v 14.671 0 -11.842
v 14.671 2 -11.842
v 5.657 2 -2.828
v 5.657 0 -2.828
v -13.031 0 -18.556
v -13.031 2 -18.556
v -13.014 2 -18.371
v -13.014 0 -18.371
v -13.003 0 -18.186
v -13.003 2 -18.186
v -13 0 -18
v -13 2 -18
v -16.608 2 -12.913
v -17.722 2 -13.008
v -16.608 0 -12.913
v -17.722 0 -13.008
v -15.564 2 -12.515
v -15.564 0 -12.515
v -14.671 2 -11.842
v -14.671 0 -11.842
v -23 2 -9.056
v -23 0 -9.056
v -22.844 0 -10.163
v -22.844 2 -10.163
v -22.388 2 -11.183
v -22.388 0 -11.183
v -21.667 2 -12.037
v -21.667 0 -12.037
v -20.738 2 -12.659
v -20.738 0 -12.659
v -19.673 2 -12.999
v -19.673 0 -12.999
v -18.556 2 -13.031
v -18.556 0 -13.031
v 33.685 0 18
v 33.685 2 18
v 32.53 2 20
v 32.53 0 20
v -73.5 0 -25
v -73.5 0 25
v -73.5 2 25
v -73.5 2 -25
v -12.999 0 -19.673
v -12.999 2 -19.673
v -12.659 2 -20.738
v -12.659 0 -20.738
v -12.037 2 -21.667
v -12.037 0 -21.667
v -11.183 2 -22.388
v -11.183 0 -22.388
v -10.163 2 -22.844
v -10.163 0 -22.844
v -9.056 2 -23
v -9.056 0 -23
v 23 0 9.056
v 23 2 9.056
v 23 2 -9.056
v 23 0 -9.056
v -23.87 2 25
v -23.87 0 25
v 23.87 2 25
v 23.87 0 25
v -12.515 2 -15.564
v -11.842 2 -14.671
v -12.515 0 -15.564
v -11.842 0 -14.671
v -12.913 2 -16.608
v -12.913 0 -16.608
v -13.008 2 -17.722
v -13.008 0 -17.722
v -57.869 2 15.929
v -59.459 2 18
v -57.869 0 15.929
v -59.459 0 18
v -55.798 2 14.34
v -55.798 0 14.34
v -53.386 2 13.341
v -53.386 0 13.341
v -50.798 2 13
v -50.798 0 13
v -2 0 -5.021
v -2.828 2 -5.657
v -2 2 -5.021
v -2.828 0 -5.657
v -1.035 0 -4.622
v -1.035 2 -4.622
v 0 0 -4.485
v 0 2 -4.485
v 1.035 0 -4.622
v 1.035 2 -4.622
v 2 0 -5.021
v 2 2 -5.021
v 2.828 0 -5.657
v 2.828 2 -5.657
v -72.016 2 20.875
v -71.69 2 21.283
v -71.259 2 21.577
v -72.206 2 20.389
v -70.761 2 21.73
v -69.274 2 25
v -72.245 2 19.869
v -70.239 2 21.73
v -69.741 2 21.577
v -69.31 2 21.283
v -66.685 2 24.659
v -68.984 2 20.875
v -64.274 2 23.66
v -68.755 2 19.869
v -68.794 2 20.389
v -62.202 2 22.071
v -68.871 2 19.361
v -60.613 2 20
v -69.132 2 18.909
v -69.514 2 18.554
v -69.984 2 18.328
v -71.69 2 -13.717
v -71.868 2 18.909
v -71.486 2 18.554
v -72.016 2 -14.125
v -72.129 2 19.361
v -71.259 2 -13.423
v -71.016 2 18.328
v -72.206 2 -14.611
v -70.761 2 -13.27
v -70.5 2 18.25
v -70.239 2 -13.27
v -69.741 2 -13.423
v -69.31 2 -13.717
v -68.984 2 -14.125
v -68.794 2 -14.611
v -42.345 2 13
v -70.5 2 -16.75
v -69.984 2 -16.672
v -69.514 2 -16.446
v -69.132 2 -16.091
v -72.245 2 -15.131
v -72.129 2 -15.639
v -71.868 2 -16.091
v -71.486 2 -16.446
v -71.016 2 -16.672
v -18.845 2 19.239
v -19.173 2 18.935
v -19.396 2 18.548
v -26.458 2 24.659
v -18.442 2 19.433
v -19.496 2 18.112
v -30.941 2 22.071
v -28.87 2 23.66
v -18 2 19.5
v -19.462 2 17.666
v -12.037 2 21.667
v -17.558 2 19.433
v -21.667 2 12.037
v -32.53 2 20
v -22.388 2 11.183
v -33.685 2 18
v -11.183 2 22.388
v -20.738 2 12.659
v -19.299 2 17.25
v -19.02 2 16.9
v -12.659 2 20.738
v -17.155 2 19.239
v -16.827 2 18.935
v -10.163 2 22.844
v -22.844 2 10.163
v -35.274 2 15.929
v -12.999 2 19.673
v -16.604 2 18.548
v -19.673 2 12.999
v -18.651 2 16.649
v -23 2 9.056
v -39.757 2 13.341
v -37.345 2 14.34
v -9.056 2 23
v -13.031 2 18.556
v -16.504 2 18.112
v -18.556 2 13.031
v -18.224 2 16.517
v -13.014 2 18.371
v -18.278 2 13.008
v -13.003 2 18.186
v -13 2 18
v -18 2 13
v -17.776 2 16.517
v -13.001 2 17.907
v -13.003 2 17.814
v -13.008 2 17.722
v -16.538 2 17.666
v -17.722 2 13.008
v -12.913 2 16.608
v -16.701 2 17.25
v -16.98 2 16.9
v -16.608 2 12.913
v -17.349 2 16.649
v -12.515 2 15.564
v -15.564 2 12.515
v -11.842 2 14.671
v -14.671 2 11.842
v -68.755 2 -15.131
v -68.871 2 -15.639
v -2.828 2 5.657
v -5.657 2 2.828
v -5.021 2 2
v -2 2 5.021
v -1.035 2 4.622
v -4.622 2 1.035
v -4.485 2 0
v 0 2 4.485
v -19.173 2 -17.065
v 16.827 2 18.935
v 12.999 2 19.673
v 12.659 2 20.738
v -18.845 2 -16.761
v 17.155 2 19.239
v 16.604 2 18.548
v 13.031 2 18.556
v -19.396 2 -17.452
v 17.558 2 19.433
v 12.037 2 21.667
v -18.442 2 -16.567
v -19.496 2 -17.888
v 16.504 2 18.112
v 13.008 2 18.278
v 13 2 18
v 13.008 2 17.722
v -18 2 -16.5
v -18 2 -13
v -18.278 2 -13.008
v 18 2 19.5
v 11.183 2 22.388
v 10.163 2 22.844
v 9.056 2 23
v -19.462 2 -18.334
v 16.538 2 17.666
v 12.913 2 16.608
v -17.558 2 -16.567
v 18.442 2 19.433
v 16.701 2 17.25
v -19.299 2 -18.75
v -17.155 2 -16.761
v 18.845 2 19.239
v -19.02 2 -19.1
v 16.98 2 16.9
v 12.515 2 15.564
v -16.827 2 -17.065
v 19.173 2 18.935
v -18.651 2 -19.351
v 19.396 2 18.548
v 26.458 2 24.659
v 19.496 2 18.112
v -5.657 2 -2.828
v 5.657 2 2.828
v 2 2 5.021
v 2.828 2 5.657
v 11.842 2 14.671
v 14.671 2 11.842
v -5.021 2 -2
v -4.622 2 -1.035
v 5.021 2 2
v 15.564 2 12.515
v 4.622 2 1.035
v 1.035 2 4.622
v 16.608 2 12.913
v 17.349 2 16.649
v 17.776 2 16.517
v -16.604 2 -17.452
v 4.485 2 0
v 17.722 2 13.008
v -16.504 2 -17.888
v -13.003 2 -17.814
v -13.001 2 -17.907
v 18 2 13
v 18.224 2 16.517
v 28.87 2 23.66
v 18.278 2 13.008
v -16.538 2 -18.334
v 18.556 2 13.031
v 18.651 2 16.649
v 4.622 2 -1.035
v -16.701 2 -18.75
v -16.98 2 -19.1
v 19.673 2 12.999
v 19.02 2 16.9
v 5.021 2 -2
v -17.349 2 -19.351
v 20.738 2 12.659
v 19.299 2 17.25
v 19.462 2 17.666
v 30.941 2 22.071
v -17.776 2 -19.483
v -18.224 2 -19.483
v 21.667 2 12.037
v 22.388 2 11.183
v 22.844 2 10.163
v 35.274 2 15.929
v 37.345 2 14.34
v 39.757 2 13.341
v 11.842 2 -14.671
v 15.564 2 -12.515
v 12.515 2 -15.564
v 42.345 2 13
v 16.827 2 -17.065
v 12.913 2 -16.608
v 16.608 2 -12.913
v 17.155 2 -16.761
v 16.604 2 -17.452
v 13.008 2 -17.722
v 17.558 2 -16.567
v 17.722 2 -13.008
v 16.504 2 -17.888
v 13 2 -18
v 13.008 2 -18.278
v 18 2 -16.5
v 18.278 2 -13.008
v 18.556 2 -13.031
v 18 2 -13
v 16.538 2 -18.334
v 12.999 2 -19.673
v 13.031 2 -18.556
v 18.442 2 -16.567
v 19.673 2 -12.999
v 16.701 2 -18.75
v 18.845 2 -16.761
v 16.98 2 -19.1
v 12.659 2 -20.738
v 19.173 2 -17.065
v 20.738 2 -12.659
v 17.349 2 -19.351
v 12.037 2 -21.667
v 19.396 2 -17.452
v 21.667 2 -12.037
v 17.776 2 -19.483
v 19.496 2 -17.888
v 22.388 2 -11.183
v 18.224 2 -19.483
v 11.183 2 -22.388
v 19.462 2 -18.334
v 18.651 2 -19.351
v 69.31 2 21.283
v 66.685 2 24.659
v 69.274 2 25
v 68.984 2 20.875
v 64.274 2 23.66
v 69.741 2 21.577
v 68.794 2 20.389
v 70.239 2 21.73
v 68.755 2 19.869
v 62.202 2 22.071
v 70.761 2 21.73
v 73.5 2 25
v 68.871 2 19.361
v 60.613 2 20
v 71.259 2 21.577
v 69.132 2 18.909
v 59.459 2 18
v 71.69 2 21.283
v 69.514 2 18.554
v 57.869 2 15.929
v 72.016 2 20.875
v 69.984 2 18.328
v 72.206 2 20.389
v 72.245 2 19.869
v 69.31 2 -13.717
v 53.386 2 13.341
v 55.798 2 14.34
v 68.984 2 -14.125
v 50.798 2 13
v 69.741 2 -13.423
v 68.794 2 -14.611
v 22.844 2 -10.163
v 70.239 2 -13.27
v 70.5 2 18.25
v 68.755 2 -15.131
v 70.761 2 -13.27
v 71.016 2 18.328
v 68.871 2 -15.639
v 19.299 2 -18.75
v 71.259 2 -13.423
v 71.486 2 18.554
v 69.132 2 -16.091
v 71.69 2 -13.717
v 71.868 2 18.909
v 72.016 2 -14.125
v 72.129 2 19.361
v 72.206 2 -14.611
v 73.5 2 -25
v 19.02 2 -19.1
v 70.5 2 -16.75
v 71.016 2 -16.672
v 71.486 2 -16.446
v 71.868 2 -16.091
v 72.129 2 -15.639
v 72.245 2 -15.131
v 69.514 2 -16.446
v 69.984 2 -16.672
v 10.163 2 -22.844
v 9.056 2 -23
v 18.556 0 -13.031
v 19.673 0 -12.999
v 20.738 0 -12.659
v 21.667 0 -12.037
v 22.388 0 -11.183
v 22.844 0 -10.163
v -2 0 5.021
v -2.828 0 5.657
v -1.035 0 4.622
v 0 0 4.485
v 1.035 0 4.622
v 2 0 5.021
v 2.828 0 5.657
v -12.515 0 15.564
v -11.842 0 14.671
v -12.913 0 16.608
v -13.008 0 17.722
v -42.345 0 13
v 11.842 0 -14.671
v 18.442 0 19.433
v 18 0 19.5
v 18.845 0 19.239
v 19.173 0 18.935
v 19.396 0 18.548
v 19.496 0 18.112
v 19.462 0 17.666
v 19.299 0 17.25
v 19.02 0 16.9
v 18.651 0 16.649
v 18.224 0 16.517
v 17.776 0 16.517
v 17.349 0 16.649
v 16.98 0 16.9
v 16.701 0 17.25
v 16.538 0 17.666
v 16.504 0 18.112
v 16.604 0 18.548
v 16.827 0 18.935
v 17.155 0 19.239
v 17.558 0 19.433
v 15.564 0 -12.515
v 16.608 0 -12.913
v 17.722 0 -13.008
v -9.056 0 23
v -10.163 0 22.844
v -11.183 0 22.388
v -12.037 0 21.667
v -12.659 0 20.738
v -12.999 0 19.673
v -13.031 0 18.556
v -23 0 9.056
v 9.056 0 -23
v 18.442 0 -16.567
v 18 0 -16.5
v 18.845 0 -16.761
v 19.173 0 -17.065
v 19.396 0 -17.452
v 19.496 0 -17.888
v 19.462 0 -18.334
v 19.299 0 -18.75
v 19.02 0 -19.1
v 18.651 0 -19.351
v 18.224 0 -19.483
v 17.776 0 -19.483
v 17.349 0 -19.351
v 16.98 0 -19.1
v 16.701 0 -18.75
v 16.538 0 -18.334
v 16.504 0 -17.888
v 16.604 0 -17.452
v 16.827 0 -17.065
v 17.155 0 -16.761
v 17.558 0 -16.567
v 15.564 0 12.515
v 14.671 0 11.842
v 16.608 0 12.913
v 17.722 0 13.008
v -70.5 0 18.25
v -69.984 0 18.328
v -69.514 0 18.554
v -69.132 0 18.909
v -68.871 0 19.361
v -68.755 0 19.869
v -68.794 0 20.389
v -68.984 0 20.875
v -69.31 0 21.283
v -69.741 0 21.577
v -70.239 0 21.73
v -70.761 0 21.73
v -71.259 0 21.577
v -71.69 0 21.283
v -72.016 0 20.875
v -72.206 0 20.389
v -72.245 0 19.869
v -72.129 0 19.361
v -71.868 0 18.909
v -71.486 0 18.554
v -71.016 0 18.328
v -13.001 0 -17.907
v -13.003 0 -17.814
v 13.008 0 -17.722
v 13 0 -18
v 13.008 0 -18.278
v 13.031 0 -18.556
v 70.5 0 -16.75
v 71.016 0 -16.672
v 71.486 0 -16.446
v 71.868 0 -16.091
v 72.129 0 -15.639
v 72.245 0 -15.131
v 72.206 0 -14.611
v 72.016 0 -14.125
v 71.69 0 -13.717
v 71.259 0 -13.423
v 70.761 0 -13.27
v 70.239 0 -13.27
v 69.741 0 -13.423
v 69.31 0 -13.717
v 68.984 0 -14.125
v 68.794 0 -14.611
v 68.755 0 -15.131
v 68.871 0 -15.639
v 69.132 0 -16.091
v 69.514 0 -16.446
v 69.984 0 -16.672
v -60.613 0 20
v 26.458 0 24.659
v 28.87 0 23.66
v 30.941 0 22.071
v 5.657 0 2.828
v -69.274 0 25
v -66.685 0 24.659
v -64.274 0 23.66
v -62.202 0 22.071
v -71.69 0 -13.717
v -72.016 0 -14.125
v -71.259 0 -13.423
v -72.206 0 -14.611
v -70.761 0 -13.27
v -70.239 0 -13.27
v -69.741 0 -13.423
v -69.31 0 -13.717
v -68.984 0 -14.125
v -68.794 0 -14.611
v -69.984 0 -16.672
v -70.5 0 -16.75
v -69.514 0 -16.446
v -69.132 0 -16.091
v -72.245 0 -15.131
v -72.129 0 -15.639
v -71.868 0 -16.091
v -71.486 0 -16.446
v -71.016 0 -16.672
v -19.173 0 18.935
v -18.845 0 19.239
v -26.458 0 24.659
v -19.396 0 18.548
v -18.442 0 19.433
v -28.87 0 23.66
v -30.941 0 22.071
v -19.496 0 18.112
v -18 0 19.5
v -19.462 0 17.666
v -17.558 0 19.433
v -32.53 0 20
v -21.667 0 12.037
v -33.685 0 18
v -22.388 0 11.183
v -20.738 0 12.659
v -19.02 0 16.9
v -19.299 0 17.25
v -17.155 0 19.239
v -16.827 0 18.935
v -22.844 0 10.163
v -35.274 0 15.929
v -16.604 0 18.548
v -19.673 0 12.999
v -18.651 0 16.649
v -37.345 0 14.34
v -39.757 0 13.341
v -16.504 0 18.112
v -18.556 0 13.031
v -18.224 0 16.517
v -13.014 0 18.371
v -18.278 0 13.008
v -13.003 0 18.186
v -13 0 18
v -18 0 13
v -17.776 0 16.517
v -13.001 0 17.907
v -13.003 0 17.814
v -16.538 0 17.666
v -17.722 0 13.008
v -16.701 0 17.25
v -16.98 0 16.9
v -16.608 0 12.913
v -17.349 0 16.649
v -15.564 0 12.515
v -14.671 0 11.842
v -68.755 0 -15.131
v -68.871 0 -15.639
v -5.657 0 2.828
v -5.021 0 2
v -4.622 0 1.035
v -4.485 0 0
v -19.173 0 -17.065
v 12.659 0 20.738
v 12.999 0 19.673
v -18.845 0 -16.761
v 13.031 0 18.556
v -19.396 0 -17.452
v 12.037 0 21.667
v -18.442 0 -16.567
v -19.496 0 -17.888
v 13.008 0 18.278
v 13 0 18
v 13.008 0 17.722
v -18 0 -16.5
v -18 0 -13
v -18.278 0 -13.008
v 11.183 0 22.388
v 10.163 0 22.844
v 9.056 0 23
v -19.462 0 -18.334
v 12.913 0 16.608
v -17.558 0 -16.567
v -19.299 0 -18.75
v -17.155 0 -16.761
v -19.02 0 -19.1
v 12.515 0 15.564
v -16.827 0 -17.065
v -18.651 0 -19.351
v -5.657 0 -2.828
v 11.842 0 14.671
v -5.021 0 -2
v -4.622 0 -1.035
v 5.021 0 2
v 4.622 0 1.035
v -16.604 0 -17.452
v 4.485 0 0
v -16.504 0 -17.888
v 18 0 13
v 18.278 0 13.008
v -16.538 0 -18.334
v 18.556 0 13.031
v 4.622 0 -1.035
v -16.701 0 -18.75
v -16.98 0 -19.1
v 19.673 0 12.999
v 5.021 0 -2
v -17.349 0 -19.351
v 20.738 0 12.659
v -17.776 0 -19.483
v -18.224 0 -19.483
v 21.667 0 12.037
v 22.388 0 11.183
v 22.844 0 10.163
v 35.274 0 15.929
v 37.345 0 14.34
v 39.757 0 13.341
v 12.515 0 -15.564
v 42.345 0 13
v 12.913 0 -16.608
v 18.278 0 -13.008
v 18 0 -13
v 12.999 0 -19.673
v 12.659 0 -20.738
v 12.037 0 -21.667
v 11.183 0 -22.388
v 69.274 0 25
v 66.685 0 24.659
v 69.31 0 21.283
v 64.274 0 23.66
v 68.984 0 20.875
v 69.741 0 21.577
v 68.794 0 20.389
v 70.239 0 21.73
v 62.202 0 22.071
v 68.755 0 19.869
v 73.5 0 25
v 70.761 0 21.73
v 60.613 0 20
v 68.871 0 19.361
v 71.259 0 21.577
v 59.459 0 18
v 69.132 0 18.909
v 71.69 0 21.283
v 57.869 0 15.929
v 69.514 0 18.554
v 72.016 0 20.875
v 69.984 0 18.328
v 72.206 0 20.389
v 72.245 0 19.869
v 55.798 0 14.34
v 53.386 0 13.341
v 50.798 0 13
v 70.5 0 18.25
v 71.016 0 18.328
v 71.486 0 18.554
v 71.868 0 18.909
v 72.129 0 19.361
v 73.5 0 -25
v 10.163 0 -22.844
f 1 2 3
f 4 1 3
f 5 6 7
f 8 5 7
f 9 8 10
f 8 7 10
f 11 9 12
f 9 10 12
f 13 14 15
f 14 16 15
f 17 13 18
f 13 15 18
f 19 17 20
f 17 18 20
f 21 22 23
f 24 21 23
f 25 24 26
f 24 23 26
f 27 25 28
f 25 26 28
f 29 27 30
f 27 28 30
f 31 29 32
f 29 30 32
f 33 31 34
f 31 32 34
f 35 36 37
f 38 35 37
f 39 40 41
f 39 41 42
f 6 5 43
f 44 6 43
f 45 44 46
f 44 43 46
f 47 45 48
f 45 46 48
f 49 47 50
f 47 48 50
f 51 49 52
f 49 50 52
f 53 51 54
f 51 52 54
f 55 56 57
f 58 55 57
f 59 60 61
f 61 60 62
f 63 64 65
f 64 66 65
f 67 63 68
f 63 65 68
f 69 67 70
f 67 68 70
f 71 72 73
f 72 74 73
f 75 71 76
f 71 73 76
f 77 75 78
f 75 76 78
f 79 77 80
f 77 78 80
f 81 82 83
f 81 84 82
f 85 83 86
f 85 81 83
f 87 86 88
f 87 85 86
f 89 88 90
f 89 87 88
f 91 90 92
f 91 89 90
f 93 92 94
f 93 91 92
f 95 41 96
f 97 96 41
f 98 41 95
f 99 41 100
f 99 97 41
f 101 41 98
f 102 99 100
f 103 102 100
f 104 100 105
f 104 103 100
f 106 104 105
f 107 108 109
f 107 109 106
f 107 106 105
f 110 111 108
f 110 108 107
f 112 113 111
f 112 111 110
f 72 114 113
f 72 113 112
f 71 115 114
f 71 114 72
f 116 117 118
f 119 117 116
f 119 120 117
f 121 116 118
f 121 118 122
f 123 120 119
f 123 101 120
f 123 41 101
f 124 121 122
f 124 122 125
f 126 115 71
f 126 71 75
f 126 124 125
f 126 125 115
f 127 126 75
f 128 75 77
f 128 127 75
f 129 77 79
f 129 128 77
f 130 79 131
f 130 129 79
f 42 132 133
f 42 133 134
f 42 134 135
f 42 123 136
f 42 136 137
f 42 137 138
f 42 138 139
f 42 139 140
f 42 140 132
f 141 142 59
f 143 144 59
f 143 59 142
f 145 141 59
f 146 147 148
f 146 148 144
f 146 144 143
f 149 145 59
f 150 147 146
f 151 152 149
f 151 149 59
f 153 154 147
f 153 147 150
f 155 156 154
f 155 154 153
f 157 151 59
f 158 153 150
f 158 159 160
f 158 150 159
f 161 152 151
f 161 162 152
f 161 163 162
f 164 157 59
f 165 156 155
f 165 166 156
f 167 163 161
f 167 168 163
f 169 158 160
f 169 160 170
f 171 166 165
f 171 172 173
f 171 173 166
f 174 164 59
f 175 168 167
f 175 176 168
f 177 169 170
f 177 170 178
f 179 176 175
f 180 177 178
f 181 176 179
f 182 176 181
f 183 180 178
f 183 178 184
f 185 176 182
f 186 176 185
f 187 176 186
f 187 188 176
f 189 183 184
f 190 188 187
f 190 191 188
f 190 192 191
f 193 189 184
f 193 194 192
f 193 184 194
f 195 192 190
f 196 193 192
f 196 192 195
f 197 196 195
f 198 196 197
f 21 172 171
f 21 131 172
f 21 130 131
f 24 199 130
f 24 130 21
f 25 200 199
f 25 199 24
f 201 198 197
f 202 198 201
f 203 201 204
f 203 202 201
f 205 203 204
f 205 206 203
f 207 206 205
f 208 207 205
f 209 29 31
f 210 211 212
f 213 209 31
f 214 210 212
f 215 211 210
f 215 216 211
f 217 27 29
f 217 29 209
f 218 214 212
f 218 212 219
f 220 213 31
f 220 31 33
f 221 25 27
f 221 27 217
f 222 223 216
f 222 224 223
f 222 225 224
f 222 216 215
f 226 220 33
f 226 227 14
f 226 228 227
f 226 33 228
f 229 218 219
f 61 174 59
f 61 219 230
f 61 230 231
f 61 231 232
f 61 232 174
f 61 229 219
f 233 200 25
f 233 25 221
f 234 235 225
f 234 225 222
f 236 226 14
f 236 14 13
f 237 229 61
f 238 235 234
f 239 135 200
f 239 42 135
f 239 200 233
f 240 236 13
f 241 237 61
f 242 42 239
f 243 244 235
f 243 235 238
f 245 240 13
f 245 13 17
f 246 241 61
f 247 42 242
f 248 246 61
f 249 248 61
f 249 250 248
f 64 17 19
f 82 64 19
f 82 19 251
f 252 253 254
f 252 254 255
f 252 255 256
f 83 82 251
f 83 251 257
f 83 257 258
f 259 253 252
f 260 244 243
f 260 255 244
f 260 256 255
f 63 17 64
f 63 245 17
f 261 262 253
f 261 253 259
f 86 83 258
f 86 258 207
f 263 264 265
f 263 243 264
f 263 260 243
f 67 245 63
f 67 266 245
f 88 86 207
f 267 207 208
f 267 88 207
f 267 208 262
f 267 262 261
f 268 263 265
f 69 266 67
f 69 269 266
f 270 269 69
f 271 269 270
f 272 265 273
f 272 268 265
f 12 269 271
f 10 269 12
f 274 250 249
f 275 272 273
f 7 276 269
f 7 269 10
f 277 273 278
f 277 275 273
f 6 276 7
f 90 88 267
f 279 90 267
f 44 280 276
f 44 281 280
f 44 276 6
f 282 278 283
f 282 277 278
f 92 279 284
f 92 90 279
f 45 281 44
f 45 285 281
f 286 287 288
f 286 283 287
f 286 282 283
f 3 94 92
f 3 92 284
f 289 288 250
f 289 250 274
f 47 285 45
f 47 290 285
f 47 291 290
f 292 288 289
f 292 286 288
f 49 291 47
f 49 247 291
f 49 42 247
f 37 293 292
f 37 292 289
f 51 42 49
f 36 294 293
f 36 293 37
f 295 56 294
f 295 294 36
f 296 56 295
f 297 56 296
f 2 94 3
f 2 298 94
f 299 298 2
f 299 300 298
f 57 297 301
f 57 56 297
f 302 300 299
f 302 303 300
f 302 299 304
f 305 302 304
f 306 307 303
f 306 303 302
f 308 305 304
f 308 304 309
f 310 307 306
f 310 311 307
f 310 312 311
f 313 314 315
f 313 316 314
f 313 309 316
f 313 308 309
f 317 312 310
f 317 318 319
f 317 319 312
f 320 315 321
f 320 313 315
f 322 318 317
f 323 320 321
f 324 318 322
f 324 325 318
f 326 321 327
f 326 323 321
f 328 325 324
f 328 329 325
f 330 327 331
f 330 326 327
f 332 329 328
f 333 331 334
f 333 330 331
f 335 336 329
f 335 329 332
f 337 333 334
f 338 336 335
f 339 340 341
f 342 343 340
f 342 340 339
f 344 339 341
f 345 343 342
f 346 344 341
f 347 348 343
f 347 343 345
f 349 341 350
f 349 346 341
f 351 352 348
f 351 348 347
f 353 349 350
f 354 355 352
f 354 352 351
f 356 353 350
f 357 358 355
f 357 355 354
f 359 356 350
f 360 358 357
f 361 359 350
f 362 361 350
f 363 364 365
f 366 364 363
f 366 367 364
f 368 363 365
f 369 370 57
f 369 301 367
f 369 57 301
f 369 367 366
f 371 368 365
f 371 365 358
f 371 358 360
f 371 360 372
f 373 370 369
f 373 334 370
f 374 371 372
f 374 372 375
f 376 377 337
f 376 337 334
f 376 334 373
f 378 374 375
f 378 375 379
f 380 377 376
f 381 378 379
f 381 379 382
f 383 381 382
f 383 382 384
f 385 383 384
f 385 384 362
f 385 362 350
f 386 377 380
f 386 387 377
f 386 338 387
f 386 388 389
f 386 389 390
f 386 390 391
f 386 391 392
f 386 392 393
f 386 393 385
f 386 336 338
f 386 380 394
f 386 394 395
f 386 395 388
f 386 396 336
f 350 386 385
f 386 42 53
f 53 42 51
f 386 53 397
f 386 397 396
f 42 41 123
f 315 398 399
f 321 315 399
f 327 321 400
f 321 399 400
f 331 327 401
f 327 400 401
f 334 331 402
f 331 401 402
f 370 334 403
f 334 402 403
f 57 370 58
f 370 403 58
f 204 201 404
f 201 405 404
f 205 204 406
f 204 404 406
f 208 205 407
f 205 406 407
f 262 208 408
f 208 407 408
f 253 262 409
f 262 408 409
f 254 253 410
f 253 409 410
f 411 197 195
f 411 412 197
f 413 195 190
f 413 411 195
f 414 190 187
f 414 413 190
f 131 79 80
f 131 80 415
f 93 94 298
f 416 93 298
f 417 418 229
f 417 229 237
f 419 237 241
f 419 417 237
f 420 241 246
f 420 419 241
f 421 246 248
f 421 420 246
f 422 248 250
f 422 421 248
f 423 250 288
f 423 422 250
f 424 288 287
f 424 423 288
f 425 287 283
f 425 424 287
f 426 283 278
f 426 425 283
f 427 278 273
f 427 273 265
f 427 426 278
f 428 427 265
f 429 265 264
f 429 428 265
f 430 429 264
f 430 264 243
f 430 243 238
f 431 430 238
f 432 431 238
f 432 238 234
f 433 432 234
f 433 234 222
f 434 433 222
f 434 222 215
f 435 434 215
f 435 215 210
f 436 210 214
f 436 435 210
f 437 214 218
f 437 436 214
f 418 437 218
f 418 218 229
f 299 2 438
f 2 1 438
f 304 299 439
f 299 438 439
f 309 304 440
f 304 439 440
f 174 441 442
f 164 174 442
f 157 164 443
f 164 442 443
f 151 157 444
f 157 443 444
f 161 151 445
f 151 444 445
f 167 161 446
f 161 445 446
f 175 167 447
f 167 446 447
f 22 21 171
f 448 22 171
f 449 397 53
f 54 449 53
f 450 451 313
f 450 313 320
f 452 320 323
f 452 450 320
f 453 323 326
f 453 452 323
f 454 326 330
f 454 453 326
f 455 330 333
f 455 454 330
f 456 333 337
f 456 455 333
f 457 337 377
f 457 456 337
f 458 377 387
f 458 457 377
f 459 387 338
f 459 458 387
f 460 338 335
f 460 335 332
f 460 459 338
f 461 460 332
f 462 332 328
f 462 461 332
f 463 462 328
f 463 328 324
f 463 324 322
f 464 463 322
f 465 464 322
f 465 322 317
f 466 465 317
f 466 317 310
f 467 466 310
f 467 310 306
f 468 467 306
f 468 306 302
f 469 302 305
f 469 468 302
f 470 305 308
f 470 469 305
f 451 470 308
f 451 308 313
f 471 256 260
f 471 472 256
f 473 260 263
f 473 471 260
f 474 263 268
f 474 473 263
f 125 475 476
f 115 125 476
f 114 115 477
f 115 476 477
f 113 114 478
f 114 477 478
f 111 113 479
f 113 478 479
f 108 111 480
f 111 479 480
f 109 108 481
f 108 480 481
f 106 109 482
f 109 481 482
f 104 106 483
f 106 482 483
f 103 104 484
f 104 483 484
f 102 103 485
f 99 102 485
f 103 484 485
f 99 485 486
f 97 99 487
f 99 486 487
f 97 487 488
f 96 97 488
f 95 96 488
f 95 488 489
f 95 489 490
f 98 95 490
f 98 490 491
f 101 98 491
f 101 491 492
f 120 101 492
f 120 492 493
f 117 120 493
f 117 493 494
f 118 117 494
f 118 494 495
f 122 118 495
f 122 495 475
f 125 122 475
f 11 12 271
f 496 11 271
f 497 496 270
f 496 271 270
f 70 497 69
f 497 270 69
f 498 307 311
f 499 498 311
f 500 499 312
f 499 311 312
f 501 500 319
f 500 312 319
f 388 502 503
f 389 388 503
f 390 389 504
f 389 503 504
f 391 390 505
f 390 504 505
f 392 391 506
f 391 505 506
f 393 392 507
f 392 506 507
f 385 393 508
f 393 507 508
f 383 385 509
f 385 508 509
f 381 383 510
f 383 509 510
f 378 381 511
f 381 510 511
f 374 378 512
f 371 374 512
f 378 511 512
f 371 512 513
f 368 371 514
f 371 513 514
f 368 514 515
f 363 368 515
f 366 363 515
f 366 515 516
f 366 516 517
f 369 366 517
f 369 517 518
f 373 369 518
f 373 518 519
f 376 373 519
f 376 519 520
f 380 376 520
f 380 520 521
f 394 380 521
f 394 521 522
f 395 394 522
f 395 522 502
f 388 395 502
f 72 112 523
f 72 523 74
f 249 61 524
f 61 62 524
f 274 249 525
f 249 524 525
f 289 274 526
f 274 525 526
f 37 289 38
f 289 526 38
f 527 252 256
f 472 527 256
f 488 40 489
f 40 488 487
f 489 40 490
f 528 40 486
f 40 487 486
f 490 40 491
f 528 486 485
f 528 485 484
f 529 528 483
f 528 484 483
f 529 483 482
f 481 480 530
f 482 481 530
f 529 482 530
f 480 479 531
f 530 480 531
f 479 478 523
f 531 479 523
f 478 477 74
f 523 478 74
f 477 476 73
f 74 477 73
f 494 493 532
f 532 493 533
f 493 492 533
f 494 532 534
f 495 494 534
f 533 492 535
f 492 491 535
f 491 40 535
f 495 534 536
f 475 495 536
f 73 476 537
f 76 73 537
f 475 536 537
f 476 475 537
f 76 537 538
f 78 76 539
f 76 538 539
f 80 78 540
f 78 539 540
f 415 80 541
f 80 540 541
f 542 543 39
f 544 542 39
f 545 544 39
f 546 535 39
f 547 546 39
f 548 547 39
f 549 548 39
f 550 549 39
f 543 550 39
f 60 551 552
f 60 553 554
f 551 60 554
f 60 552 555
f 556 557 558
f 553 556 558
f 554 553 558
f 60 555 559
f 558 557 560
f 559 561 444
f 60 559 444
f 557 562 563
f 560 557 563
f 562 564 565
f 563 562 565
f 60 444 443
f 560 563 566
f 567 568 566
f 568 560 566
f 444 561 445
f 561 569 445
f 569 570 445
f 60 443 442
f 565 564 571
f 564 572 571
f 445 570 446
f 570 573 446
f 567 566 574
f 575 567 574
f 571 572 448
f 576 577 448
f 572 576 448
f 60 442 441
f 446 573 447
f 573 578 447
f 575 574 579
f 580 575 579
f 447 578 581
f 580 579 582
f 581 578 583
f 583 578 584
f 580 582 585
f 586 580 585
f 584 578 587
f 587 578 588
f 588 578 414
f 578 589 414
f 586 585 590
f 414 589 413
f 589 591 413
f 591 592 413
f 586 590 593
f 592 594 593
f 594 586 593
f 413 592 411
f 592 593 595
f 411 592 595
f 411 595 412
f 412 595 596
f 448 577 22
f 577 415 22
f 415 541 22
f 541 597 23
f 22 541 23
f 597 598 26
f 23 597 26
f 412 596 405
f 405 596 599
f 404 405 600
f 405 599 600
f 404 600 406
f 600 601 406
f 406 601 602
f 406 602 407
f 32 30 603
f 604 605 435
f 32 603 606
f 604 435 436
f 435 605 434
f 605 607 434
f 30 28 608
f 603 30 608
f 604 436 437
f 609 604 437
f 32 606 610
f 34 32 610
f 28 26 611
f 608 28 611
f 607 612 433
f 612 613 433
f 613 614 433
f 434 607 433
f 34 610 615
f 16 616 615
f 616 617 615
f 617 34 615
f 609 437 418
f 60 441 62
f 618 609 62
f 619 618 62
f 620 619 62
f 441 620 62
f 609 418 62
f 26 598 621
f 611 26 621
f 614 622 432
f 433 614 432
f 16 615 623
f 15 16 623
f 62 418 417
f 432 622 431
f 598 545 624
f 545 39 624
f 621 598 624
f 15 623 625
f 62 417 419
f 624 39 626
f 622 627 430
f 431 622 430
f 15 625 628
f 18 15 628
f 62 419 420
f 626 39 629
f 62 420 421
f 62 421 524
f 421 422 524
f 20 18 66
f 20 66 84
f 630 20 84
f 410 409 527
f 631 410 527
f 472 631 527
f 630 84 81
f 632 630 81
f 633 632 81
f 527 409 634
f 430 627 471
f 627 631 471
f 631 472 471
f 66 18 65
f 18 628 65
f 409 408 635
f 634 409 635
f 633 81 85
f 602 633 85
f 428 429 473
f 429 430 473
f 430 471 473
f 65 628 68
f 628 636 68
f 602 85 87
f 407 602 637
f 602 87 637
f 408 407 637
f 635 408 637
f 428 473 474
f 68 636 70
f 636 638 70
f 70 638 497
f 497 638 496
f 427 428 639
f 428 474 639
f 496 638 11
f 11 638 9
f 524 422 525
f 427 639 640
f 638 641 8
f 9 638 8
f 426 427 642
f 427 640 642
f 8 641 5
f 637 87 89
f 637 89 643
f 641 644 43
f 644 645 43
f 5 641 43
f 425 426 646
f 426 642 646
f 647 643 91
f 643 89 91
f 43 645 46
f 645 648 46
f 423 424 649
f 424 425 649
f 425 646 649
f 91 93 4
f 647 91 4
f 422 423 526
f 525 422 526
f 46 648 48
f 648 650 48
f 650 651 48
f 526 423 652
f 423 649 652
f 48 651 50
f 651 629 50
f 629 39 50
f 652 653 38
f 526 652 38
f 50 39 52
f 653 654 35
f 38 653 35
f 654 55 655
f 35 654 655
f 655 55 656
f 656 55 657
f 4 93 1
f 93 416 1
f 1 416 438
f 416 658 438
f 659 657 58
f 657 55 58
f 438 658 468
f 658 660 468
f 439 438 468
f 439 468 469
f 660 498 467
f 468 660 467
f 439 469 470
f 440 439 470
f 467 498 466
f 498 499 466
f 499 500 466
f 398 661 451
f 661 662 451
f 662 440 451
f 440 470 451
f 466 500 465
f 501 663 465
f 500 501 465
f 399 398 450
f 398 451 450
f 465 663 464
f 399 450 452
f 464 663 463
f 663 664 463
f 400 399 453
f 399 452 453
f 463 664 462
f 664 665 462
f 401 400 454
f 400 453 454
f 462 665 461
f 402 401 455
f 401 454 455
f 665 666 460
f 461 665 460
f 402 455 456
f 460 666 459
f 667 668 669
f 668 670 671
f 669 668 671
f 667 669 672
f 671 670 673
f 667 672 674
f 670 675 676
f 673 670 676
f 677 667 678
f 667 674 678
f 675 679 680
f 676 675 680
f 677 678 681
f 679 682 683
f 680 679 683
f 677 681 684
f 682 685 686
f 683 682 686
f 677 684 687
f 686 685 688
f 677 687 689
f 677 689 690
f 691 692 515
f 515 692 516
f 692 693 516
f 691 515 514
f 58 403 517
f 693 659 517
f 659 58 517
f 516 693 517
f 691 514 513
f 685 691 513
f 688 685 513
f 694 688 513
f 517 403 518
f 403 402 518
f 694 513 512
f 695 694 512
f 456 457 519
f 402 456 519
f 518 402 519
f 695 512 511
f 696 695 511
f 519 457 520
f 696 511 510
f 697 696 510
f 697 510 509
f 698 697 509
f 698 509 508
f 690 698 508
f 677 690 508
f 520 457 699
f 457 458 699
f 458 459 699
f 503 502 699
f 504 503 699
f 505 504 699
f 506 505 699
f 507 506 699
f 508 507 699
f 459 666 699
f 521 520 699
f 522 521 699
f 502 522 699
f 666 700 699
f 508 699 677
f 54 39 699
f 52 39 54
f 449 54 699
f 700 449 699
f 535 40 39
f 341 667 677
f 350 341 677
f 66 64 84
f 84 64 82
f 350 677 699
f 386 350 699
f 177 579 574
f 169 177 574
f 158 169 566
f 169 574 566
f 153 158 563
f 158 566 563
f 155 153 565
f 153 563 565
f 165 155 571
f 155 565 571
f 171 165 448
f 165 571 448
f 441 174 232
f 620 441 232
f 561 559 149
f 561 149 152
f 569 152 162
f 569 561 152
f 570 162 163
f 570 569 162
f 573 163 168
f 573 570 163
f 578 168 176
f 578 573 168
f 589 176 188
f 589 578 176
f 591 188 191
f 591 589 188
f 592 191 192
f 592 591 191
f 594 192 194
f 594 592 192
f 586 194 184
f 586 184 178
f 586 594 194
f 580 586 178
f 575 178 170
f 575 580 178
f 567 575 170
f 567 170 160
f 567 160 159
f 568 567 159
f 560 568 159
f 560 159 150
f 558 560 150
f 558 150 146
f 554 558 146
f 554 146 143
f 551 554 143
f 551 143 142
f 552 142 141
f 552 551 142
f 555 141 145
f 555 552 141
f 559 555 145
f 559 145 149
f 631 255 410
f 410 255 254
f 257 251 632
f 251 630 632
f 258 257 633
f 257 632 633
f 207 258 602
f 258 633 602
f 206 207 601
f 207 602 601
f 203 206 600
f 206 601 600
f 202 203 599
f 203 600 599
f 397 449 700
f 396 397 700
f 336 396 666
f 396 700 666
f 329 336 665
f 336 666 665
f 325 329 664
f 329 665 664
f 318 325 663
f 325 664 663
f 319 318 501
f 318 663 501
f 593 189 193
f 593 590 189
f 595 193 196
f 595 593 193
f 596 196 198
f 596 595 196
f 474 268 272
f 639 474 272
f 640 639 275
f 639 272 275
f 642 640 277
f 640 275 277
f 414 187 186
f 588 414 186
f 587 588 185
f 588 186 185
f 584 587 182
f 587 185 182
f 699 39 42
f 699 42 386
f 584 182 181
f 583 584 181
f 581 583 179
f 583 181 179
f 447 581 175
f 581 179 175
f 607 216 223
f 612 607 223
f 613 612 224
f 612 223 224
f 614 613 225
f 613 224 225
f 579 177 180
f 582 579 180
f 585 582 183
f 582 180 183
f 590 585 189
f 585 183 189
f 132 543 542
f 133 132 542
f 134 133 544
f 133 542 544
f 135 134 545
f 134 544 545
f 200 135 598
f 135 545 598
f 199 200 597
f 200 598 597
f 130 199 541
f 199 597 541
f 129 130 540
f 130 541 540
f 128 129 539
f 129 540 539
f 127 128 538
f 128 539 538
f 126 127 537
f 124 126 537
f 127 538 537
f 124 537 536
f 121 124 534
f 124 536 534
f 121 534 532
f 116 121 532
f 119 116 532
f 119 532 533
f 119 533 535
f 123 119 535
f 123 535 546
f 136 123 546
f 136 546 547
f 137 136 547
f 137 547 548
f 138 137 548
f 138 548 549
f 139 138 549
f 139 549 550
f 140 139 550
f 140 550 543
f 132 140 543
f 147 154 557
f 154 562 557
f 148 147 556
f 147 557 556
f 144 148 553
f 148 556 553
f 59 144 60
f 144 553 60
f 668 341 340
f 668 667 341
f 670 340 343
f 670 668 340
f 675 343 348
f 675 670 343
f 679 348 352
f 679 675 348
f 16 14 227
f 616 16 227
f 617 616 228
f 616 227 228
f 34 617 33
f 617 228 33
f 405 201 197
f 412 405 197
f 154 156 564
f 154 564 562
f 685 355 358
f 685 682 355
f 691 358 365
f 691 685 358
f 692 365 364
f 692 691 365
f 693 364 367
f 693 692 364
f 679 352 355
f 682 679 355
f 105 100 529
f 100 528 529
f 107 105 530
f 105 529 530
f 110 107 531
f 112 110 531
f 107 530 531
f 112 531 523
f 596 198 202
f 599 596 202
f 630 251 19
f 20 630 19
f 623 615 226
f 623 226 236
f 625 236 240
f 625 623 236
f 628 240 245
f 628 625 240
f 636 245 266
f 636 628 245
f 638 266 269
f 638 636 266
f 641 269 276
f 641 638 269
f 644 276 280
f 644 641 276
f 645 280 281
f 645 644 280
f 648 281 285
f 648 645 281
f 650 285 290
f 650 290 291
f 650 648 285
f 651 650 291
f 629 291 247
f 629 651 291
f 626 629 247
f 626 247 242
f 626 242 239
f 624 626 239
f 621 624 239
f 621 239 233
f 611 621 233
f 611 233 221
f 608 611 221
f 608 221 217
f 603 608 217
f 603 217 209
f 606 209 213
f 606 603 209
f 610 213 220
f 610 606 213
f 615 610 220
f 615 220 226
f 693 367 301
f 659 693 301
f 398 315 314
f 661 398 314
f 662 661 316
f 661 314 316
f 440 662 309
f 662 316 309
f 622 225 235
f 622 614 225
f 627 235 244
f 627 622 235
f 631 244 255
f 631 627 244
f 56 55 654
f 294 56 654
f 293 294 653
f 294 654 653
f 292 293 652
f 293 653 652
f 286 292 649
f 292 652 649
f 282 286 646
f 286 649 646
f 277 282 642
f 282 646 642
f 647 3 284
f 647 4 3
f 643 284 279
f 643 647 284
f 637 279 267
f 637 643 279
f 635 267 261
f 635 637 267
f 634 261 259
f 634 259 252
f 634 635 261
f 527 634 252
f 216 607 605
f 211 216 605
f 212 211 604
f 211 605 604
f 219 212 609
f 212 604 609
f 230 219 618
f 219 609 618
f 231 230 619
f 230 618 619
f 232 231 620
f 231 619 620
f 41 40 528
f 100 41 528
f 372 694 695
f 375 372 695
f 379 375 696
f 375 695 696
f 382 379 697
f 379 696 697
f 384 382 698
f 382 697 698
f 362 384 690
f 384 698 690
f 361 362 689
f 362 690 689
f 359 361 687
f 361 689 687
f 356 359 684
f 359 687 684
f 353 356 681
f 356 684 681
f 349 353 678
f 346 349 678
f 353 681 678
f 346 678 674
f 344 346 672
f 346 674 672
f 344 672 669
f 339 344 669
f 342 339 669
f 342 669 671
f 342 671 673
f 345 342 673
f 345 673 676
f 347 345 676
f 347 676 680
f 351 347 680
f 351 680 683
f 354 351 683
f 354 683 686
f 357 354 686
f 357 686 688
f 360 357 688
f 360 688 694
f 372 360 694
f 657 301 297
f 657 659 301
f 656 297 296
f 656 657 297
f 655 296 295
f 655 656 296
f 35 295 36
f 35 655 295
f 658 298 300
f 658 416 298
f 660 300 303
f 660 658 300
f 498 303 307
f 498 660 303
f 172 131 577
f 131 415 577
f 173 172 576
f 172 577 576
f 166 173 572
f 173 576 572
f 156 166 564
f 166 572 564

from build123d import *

# Parameters (mm, degrees)
SKETCH_1_W          = 147
SKETCH_1_H          = 50
SKETCH_1_R          = 1.5
EXTRUDE_1_DEPTH     = 2
CUT_EXTRUDE_1_DEPTH = 2
FILLET_2_DEPTH      = 2
FILLET_3_R          = 4
CUT_EXTRUDE_3_DEPTH = 78.661122835
SKETCH_7_R          = 1.75
CUT_EXTRUDE_4_DEPTH = 78.661122835
FILLET_4_R          = 10


with BuildPart() as part:
    # 草图1 → 凸台-拉伸1 (new body)
    with BuildSketch(Plane(origin=(0, 0, 0), x_dir=(1, 0, 0), z_dir=(0, 1, 0))):
        Rectangle(SKETCH_1_W, SKETCH_1_H)
        with Locations(Location((18, -18, 0), (0, 0, 270))):
            Circle(SKETCH_1_R, mode=Mode.SUBTRACT)
        with Locations(Location((-18, -18, 0), (0, 0, 270))):
            Circle(SKETCH_1_R, mode=Mode.SUBTRACT)
        with Locations(Location((-18, 18, 0), (0, 0, 270))):
            Circle(SKETCH_1_R, mode=Mode.SUBTRACT)
        with Locations(Location((18, 18, 0), (0, 0, 270))):
            Circle(SKETCH_1_R, mode=Mode.SUBTRACT)
    extrude(amount=EXTRUDE_1_DEPTH)

    # 草图3 → 切除-拉伸1 (cut)
    with BuildSketch(Plane(origin=(0, 2, 0), x_dir=(1, 0, 0), z_dir=(0, 1, 0))):
        with BuildLine():
            Line((-13.345416088, 16.173843213), (0, 2.828427125))
            Line((0, 2.828427125), (13.345416088, 16.173843213))
            ThreePointArc((13.345416088, 16.173843213), (13.868972045, 20.816843629), (18, 23))
            Line((18, 23), (-18, 23))
            ThreePointArc((-18, 23), (-14.464466094, 21.535533906), (-13, 18))
            ThreePointArc((-13, 18), (-13.087112888, 17.070731352), (-13.345416088, 16.173843213))
        make_face()
        with BuildLine():
            Line((16.173843213, 13.345416088), (2.828427125, 0))
            Line((2.828427125, 0), (16.173843213, -13.345416088))
            ThreePointArc((16.173843213, -13.345416088), (20.816843629, -13.868972045), (23, -18))
            Line((23, -18), (23, 18))
            ThreePointArc((23, 18), (20.816843629, 13.868972045), (16.173843213, 13.345416088))
        make_face()
        with BuildLine():
            Line((0, -2.828427125), (-13.345416088, -16.173843213))
            ThreePointArc((-13.345416088, -16.173843213), (-13.087112888, -17.070731352), (-13, -18))
            ThreePointArc((-13, -18), (-14.464466094, -21.535533906), (-18, -23))
            Line((-18, -23), (18, -23))
            ThreePointArc((18, -23), (13.868972045, -20.816843629), (13.345416088, -16.173843213))
            Line((13.345416088, -16.173843213), (0, -2.828427125))
        make_face()
        with BuildLine():
            ThreePointArc((-23, -18), (-20.816843629, -13.868972045), (-16.173843213, -13.345416088))
            Line((-16.173843213, -13.345416088), (-2.828427125, 0))
            Line((-2.828427125, 0), (-16.173843213, 13.345416088))
            ThreePointArc((-16.173843213, 13.345416088), (-20.816843629, 13.868972045), (-23, 18))
            Line((-23, 18), (-23, -18))
        make_face()
    extrude(amount=-CUT_EXTRUDE_1_DEPTH, mode=Mode.SUBTRACT)

    # 圆角2: read off the stored shape, not the designer's step
    # 圆角2 outline → 圆角2 (add)
    with BuildSketch(Plane(origin=(0, 0, 0), x_dir=(1, 0, 0), z_dir=(0, 1, 0))):
        with BuildLine():
            Line((-23, 18), (-23, 9.05572809))
            ThreePointArc((-23, 9.05572809), (-21.666666667, 12.03715206), (-18.555555556, 13.03096005))
            ThreePointArc((-18.555555556, 13.03096005), (-21.726779962, 14.666666667), (-23, 18))
        make_face()
        with BuildLine():
            ThreePointArc((-18.555555556, -13.03096005), (-21.666666667, -12.03715206), (-23, -9.05572809))
            Line((-23, -9.05572809), (-23, -18))
            ThreePointArc((-23, -18), (-21.726779962, -14.666666667), (-18.555555556, -13.03096005))
        make_face()
        with BuildLine():
            ThreePointArc((13.03096005, -18.555555556), (12.03715206, -21.666666667), (9.05572809, -23))
            Line((9.05572809, -23), (18, -23))
            ThreePointArc((18, -23), (14.666666667, -21.726779962), (13.03096005, -18.555555556))
        make_face()
        with BuildLine():
            ThreePointArc((-9.05572809, -23), (-12.03715206, -21.666666667), (-13.03096005, -18.555555556))
            ThreePointArc((-13.03096005, -18.555555556), (-14.666666667, -21.726779962), (-18, -23))
            Line((-18, -23), (-9.05572809, -23))
        make_face()
        with BuildLine():
            ThreePointArc((18.555555556, 13.03096005), (21.666666667, 12.03715206), (23, 9.05572809))
            Line((23, 9.05572809), (23, 18))
            ThreePointArc((23, 18), (21.726779962, 14.666666667), (18.555555556, 13.03096005))
        make_face()
        with BuildLine():
            ThreePointArc((23, -9.05572809), (21.666666667, -12.03715206), (18.555555556, -13.03096005))
            ThreePointArc((18.555555556, -13.03096005), (21.726779962, -14.666666667), (23, -18))
            Line((23, -18), (23, -9.05572809))
        make_face()
        with BuildLine():
            ThreePointArc((-13.03096005, 18.555555556), (-12.03715206, 21.666666667), (-9.05572809, 23))
            Line((-9.05572809, 23), (-18, 23))
            ThreePointArc((-18, 23), (-14.666666667, 21.726779962), (-13.03096005, 18.555555556))
        make_face()
        with BuildLine():
            ThreePointArc((9.05572809, 23), (12.03715206, 21.666666667), (13.03096005, 18.555555556))
            ThreePointArc((13.03096005, 18.555555556), (14.666666667, 21.726779962), (18, 23))
            Line((18, 23), (9.05572809, 23))
        make_face()
    extrude(amount=FILLET_2_DEPTH)

    # 圆角3
    fillet_3_edges = [part.edges().sort_by_distance(p)[0] for p in [
        (13.345416088, 1, 16.173843213),
        (-13.345416088, 1, 16.173843213),
        (0, 1, 2.828427125),
        (16.173843213, 1, -13.345416088),
        (16.173843213, 1, 13.345416088),
        (2.828427125, 1, 0),
        (-16.173843213, 1, -13.345416088),
        (-2.828427125, 1, 0),
        (-16.173843213, 1, 13.345416088),
        (-13.345416088, 1, -16.173843213),
        (13.345416088, 1, -16.173843213),
        (0, 1, -2.828427125),
    ]]
    fillet(fillet_3_edges, radius=FILLET_3_R)

    # 草图6 → 切除-拉伸3 (cut, through all)
    with BuildSketch(Plane(origin=(0, 2, 0), x_dir=(1, 0, 0), z_dir=(0, 1, 0))):
        Polygon((63.5, -25), (56.57179677, -13), (36.57179677, -13), (29.643593539, -25), align=None)
    cut_extrude_3 = extrude(amount=-CUT_EXTRUDE_3_DEPTH, mode=Mode.SUBTRACT)

    # 镜向1: 切除-拉伸3 across plane
    add(cut_extrude_3.mirror(Plane(origin=(0, 0, 0), x_dir=(0, 0, 1), z_dir=(1, 0, 0))), mode=Mode.SUBTRACT)

    # 草图7 → 切除-拉伸4 (cut, through all)
    with BuildSketch(Plane.XZ):
        with Locations(Location((70.5, 20, 0), (0, 0, 270))):
            Circle(SKETCH_7_R)
        with Locations(Location((70.5, -15, 0), (0, 0, 270))):
            Circle(SKETCH_7_R)
        with Locations(Location((-70.5, -15, 0), (0, 0, 270))):
            Circle(SKETCH_7_R)
        with Locations(Location((-70.5, 20, 0), (0, 0, 270))):
            Circle(SKETCH_7_R)
    extrude(amount=-CUT_EXTRUDE_4_DEPTH, mode=Mode.SUBTRACT)

    # 圆角4
    fillet_4_edges = [part.edges().sort_by_distance(p)[0] for p in [
        (63.5, 1, 25),
        (29.643593539, 1, 25),
        (36.57179677, 1, 13),
        (56.57179677, 1, 13),
        (-29.643593539, 1, 25),
        (-63.5, 1, 25),
        (-56.57179677, 1, 13),
        (-36.57179677, 1, 13),
    ]]
    fillet(fillet_4_edges, radius=FILLET_4_R)


solid = part.part
